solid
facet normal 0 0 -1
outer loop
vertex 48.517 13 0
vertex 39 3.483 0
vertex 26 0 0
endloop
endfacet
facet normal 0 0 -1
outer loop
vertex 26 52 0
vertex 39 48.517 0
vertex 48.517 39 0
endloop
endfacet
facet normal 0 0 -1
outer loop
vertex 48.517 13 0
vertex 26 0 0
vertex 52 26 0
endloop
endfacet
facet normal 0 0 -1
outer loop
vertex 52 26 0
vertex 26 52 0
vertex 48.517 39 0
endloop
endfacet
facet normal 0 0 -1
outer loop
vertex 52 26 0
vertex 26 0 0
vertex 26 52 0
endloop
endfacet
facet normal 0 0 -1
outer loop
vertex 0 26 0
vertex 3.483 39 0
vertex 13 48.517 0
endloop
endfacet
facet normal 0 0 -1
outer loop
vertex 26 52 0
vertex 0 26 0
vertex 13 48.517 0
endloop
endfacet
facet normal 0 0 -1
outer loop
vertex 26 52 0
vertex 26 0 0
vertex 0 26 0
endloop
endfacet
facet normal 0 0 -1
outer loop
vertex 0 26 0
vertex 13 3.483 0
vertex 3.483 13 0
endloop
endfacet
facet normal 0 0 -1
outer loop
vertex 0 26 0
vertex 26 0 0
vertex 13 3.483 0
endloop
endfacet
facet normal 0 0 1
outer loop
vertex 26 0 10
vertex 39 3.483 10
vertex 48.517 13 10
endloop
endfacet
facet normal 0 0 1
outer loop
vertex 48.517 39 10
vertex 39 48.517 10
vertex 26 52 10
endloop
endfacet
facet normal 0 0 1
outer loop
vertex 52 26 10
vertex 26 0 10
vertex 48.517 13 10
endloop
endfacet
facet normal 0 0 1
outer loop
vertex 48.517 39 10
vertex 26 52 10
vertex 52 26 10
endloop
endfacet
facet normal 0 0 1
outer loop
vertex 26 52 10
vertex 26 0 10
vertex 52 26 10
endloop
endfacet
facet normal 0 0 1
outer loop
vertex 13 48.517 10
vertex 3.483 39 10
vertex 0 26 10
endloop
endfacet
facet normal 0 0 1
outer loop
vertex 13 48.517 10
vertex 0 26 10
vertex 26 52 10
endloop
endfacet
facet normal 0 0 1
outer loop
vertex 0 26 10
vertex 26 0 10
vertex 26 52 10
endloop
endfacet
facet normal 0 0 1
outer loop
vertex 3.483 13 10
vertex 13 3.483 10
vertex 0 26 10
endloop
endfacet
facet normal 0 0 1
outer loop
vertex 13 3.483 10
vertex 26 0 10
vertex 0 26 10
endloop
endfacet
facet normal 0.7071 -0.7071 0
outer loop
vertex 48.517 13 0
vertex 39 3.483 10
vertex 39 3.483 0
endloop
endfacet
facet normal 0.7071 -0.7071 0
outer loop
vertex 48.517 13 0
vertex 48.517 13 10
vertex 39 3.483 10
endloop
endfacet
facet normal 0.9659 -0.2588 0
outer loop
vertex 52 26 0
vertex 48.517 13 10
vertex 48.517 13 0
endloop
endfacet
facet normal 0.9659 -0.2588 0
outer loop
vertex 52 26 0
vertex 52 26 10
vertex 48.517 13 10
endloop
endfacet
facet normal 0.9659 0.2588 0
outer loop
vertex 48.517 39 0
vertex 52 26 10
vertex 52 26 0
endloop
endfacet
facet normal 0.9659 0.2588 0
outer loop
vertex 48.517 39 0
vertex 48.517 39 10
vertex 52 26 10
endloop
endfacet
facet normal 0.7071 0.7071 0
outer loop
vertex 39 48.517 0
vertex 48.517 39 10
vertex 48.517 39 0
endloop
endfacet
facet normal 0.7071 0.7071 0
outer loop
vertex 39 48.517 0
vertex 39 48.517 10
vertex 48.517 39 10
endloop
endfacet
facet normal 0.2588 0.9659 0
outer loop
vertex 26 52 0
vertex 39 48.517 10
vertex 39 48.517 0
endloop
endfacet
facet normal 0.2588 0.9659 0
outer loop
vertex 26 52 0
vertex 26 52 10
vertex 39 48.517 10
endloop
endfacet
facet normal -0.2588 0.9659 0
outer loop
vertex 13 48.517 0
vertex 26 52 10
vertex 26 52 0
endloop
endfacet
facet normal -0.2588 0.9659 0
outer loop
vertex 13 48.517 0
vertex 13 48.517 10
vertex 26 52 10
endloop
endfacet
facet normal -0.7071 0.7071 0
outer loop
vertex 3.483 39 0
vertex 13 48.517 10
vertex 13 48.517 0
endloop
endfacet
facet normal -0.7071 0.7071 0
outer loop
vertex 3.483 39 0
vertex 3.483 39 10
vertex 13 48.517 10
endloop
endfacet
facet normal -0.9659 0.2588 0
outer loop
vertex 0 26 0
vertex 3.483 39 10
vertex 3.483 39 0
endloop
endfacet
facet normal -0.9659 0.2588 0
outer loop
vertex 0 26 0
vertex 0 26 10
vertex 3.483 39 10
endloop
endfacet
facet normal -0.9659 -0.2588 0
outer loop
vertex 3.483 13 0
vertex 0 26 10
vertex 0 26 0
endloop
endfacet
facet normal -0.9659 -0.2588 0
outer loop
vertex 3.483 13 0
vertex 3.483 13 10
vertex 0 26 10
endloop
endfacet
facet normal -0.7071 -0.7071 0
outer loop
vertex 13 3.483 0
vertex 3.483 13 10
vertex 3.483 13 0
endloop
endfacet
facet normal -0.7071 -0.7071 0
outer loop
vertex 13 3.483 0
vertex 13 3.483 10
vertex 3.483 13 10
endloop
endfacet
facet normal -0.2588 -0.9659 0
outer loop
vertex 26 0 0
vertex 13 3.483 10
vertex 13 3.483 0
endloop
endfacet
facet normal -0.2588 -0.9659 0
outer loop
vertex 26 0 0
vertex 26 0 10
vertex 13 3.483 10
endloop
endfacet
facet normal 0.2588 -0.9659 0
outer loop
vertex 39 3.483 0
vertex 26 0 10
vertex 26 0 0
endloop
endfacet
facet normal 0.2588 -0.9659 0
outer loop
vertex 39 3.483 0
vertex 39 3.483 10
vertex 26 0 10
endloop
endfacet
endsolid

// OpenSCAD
$fn = 32;

// ----------------------------------------------------------------------
// Eccentric disc: egg, 10 mm thick
// ----------------------------------------------------------------------

// --- parameters (mm) ---
profile_height = 10;      // extrusion height
profile_points = 12;      // points of the closed outline

profile = [[0, 26], [3.483, 13], [13, 3.483], [26, 0], [39, 3.483], [48.517, 13], [52, 26], [48.517, 39], [39, 48.517], [26, 52], [13, 48.517], [3.483, 39]];  // single closed polygon, 12 points, counter clockwise

// --- the one profile operation ---
linear_extrude(height = profile_height) polygon(points = profile);
